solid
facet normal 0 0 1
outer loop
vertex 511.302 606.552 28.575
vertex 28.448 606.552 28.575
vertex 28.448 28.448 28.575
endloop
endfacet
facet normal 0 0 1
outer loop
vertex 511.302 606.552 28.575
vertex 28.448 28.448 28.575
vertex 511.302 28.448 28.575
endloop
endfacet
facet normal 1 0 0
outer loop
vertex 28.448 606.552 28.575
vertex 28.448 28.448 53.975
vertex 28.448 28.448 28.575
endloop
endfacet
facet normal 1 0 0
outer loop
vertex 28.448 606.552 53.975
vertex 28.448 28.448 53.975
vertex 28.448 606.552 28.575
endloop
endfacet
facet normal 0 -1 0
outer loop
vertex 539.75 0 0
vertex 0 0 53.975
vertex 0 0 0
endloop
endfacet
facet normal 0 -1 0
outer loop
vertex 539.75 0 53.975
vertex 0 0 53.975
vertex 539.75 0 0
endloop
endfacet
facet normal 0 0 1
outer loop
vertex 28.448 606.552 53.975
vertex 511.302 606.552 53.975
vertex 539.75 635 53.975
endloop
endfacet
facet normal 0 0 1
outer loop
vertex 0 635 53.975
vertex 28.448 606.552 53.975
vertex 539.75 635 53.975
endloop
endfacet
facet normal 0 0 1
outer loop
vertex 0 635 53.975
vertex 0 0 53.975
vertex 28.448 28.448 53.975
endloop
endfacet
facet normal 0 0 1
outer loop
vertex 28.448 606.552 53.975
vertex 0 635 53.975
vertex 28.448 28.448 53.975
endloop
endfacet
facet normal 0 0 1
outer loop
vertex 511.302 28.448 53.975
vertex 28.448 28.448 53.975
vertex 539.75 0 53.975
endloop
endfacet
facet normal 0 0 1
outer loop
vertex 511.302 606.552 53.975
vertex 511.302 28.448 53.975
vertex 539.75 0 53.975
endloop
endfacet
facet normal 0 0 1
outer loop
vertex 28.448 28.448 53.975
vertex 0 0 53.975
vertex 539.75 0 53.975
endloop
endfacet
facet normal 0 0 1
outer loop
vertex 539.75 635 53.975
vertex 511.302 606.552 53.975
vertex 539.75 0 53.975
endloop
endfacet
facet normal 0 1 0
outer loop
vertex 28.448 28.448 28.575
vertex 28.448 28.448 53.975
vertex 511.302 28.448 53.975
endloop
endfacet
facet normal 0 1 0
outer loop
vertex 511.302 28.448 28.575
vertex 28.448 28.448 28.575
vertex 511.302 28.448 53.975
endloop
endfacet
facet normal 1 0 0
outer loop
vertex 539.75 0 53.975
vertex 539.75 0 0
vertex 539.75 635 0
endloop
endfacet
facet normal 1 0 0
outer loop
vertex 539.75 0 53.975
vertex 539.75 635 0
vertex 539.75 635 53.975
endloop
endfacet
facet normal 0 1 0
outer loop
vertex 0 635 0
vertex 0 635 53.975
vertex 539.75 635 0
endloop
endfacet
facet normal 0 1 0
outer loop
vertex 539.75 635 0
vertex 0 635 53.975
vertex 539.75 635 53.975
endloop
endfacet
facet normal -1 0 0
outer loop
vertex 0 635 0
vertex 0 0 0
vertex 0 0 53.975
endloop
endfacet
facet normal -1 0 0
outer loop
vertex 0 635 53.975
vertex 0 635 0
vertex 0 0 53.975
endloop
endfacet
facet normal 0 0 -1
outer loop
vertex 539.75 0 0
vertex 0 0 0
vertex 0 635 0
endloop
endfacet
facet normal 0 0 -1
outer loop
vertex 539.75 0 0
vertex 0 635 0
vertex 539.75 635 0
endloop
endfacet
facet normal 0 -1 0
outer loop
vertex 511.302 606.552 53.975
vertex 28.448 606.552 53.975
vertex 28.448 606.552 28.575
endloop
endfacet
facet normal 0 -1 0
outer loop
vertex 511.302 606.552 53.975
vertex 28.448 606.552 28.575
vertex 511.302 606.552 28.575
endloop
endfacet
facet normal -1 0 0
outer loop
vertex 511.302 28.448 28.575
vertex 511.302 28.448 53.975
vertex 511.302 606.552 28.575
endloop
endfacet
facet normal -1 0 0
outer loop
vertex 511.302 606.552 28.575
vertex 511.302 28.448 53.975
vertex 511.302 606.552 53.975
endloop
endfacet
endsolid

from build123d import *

# Parameters (mm, degrees)
F0_W      = 539.75
F0_H      = 53.975
F1_DEPTH  = 635
F2_W      = 482.854
F2_H      = 578.104
F3_DEPTH  = 25.4
F1_FACE_W = 539.75
F1_FACE_H = 635
F5_DEPTH  = 28.575


with BuildPart() as f1:
    # F0 (on Front) → F1 (new body)
    with BuildSketch(Plane.XZ):
        with Locations((269.875, 26.9875)):
            Rectangle(F0_W, F0_H)
    extrude(amount=-F1_DEPTH)

    # F2 (on face) → F3 (cut)
    with BuildSketch(Plane.XY.offset(53.975)):
        with Locations((269.875, 317.5)):
            Rectangle(F2_W, F2_H)
    extrude(amount=-F3_DEPTH, mode=Mode.SUBTRACT)


with BuildPart() as f5:
    # F1_face (on face) → F5 (new body)
    with BuildSketch(Plane(origin=(269.875, 317.5, 53.975), x_dir=(1, 0, 0), z_dir=(0, 0, 1))):
        Rectangle(F1_FACE_W, F1_FACE_H)
    extrude(amount=F5_DEPTH)


solid = f1.part
